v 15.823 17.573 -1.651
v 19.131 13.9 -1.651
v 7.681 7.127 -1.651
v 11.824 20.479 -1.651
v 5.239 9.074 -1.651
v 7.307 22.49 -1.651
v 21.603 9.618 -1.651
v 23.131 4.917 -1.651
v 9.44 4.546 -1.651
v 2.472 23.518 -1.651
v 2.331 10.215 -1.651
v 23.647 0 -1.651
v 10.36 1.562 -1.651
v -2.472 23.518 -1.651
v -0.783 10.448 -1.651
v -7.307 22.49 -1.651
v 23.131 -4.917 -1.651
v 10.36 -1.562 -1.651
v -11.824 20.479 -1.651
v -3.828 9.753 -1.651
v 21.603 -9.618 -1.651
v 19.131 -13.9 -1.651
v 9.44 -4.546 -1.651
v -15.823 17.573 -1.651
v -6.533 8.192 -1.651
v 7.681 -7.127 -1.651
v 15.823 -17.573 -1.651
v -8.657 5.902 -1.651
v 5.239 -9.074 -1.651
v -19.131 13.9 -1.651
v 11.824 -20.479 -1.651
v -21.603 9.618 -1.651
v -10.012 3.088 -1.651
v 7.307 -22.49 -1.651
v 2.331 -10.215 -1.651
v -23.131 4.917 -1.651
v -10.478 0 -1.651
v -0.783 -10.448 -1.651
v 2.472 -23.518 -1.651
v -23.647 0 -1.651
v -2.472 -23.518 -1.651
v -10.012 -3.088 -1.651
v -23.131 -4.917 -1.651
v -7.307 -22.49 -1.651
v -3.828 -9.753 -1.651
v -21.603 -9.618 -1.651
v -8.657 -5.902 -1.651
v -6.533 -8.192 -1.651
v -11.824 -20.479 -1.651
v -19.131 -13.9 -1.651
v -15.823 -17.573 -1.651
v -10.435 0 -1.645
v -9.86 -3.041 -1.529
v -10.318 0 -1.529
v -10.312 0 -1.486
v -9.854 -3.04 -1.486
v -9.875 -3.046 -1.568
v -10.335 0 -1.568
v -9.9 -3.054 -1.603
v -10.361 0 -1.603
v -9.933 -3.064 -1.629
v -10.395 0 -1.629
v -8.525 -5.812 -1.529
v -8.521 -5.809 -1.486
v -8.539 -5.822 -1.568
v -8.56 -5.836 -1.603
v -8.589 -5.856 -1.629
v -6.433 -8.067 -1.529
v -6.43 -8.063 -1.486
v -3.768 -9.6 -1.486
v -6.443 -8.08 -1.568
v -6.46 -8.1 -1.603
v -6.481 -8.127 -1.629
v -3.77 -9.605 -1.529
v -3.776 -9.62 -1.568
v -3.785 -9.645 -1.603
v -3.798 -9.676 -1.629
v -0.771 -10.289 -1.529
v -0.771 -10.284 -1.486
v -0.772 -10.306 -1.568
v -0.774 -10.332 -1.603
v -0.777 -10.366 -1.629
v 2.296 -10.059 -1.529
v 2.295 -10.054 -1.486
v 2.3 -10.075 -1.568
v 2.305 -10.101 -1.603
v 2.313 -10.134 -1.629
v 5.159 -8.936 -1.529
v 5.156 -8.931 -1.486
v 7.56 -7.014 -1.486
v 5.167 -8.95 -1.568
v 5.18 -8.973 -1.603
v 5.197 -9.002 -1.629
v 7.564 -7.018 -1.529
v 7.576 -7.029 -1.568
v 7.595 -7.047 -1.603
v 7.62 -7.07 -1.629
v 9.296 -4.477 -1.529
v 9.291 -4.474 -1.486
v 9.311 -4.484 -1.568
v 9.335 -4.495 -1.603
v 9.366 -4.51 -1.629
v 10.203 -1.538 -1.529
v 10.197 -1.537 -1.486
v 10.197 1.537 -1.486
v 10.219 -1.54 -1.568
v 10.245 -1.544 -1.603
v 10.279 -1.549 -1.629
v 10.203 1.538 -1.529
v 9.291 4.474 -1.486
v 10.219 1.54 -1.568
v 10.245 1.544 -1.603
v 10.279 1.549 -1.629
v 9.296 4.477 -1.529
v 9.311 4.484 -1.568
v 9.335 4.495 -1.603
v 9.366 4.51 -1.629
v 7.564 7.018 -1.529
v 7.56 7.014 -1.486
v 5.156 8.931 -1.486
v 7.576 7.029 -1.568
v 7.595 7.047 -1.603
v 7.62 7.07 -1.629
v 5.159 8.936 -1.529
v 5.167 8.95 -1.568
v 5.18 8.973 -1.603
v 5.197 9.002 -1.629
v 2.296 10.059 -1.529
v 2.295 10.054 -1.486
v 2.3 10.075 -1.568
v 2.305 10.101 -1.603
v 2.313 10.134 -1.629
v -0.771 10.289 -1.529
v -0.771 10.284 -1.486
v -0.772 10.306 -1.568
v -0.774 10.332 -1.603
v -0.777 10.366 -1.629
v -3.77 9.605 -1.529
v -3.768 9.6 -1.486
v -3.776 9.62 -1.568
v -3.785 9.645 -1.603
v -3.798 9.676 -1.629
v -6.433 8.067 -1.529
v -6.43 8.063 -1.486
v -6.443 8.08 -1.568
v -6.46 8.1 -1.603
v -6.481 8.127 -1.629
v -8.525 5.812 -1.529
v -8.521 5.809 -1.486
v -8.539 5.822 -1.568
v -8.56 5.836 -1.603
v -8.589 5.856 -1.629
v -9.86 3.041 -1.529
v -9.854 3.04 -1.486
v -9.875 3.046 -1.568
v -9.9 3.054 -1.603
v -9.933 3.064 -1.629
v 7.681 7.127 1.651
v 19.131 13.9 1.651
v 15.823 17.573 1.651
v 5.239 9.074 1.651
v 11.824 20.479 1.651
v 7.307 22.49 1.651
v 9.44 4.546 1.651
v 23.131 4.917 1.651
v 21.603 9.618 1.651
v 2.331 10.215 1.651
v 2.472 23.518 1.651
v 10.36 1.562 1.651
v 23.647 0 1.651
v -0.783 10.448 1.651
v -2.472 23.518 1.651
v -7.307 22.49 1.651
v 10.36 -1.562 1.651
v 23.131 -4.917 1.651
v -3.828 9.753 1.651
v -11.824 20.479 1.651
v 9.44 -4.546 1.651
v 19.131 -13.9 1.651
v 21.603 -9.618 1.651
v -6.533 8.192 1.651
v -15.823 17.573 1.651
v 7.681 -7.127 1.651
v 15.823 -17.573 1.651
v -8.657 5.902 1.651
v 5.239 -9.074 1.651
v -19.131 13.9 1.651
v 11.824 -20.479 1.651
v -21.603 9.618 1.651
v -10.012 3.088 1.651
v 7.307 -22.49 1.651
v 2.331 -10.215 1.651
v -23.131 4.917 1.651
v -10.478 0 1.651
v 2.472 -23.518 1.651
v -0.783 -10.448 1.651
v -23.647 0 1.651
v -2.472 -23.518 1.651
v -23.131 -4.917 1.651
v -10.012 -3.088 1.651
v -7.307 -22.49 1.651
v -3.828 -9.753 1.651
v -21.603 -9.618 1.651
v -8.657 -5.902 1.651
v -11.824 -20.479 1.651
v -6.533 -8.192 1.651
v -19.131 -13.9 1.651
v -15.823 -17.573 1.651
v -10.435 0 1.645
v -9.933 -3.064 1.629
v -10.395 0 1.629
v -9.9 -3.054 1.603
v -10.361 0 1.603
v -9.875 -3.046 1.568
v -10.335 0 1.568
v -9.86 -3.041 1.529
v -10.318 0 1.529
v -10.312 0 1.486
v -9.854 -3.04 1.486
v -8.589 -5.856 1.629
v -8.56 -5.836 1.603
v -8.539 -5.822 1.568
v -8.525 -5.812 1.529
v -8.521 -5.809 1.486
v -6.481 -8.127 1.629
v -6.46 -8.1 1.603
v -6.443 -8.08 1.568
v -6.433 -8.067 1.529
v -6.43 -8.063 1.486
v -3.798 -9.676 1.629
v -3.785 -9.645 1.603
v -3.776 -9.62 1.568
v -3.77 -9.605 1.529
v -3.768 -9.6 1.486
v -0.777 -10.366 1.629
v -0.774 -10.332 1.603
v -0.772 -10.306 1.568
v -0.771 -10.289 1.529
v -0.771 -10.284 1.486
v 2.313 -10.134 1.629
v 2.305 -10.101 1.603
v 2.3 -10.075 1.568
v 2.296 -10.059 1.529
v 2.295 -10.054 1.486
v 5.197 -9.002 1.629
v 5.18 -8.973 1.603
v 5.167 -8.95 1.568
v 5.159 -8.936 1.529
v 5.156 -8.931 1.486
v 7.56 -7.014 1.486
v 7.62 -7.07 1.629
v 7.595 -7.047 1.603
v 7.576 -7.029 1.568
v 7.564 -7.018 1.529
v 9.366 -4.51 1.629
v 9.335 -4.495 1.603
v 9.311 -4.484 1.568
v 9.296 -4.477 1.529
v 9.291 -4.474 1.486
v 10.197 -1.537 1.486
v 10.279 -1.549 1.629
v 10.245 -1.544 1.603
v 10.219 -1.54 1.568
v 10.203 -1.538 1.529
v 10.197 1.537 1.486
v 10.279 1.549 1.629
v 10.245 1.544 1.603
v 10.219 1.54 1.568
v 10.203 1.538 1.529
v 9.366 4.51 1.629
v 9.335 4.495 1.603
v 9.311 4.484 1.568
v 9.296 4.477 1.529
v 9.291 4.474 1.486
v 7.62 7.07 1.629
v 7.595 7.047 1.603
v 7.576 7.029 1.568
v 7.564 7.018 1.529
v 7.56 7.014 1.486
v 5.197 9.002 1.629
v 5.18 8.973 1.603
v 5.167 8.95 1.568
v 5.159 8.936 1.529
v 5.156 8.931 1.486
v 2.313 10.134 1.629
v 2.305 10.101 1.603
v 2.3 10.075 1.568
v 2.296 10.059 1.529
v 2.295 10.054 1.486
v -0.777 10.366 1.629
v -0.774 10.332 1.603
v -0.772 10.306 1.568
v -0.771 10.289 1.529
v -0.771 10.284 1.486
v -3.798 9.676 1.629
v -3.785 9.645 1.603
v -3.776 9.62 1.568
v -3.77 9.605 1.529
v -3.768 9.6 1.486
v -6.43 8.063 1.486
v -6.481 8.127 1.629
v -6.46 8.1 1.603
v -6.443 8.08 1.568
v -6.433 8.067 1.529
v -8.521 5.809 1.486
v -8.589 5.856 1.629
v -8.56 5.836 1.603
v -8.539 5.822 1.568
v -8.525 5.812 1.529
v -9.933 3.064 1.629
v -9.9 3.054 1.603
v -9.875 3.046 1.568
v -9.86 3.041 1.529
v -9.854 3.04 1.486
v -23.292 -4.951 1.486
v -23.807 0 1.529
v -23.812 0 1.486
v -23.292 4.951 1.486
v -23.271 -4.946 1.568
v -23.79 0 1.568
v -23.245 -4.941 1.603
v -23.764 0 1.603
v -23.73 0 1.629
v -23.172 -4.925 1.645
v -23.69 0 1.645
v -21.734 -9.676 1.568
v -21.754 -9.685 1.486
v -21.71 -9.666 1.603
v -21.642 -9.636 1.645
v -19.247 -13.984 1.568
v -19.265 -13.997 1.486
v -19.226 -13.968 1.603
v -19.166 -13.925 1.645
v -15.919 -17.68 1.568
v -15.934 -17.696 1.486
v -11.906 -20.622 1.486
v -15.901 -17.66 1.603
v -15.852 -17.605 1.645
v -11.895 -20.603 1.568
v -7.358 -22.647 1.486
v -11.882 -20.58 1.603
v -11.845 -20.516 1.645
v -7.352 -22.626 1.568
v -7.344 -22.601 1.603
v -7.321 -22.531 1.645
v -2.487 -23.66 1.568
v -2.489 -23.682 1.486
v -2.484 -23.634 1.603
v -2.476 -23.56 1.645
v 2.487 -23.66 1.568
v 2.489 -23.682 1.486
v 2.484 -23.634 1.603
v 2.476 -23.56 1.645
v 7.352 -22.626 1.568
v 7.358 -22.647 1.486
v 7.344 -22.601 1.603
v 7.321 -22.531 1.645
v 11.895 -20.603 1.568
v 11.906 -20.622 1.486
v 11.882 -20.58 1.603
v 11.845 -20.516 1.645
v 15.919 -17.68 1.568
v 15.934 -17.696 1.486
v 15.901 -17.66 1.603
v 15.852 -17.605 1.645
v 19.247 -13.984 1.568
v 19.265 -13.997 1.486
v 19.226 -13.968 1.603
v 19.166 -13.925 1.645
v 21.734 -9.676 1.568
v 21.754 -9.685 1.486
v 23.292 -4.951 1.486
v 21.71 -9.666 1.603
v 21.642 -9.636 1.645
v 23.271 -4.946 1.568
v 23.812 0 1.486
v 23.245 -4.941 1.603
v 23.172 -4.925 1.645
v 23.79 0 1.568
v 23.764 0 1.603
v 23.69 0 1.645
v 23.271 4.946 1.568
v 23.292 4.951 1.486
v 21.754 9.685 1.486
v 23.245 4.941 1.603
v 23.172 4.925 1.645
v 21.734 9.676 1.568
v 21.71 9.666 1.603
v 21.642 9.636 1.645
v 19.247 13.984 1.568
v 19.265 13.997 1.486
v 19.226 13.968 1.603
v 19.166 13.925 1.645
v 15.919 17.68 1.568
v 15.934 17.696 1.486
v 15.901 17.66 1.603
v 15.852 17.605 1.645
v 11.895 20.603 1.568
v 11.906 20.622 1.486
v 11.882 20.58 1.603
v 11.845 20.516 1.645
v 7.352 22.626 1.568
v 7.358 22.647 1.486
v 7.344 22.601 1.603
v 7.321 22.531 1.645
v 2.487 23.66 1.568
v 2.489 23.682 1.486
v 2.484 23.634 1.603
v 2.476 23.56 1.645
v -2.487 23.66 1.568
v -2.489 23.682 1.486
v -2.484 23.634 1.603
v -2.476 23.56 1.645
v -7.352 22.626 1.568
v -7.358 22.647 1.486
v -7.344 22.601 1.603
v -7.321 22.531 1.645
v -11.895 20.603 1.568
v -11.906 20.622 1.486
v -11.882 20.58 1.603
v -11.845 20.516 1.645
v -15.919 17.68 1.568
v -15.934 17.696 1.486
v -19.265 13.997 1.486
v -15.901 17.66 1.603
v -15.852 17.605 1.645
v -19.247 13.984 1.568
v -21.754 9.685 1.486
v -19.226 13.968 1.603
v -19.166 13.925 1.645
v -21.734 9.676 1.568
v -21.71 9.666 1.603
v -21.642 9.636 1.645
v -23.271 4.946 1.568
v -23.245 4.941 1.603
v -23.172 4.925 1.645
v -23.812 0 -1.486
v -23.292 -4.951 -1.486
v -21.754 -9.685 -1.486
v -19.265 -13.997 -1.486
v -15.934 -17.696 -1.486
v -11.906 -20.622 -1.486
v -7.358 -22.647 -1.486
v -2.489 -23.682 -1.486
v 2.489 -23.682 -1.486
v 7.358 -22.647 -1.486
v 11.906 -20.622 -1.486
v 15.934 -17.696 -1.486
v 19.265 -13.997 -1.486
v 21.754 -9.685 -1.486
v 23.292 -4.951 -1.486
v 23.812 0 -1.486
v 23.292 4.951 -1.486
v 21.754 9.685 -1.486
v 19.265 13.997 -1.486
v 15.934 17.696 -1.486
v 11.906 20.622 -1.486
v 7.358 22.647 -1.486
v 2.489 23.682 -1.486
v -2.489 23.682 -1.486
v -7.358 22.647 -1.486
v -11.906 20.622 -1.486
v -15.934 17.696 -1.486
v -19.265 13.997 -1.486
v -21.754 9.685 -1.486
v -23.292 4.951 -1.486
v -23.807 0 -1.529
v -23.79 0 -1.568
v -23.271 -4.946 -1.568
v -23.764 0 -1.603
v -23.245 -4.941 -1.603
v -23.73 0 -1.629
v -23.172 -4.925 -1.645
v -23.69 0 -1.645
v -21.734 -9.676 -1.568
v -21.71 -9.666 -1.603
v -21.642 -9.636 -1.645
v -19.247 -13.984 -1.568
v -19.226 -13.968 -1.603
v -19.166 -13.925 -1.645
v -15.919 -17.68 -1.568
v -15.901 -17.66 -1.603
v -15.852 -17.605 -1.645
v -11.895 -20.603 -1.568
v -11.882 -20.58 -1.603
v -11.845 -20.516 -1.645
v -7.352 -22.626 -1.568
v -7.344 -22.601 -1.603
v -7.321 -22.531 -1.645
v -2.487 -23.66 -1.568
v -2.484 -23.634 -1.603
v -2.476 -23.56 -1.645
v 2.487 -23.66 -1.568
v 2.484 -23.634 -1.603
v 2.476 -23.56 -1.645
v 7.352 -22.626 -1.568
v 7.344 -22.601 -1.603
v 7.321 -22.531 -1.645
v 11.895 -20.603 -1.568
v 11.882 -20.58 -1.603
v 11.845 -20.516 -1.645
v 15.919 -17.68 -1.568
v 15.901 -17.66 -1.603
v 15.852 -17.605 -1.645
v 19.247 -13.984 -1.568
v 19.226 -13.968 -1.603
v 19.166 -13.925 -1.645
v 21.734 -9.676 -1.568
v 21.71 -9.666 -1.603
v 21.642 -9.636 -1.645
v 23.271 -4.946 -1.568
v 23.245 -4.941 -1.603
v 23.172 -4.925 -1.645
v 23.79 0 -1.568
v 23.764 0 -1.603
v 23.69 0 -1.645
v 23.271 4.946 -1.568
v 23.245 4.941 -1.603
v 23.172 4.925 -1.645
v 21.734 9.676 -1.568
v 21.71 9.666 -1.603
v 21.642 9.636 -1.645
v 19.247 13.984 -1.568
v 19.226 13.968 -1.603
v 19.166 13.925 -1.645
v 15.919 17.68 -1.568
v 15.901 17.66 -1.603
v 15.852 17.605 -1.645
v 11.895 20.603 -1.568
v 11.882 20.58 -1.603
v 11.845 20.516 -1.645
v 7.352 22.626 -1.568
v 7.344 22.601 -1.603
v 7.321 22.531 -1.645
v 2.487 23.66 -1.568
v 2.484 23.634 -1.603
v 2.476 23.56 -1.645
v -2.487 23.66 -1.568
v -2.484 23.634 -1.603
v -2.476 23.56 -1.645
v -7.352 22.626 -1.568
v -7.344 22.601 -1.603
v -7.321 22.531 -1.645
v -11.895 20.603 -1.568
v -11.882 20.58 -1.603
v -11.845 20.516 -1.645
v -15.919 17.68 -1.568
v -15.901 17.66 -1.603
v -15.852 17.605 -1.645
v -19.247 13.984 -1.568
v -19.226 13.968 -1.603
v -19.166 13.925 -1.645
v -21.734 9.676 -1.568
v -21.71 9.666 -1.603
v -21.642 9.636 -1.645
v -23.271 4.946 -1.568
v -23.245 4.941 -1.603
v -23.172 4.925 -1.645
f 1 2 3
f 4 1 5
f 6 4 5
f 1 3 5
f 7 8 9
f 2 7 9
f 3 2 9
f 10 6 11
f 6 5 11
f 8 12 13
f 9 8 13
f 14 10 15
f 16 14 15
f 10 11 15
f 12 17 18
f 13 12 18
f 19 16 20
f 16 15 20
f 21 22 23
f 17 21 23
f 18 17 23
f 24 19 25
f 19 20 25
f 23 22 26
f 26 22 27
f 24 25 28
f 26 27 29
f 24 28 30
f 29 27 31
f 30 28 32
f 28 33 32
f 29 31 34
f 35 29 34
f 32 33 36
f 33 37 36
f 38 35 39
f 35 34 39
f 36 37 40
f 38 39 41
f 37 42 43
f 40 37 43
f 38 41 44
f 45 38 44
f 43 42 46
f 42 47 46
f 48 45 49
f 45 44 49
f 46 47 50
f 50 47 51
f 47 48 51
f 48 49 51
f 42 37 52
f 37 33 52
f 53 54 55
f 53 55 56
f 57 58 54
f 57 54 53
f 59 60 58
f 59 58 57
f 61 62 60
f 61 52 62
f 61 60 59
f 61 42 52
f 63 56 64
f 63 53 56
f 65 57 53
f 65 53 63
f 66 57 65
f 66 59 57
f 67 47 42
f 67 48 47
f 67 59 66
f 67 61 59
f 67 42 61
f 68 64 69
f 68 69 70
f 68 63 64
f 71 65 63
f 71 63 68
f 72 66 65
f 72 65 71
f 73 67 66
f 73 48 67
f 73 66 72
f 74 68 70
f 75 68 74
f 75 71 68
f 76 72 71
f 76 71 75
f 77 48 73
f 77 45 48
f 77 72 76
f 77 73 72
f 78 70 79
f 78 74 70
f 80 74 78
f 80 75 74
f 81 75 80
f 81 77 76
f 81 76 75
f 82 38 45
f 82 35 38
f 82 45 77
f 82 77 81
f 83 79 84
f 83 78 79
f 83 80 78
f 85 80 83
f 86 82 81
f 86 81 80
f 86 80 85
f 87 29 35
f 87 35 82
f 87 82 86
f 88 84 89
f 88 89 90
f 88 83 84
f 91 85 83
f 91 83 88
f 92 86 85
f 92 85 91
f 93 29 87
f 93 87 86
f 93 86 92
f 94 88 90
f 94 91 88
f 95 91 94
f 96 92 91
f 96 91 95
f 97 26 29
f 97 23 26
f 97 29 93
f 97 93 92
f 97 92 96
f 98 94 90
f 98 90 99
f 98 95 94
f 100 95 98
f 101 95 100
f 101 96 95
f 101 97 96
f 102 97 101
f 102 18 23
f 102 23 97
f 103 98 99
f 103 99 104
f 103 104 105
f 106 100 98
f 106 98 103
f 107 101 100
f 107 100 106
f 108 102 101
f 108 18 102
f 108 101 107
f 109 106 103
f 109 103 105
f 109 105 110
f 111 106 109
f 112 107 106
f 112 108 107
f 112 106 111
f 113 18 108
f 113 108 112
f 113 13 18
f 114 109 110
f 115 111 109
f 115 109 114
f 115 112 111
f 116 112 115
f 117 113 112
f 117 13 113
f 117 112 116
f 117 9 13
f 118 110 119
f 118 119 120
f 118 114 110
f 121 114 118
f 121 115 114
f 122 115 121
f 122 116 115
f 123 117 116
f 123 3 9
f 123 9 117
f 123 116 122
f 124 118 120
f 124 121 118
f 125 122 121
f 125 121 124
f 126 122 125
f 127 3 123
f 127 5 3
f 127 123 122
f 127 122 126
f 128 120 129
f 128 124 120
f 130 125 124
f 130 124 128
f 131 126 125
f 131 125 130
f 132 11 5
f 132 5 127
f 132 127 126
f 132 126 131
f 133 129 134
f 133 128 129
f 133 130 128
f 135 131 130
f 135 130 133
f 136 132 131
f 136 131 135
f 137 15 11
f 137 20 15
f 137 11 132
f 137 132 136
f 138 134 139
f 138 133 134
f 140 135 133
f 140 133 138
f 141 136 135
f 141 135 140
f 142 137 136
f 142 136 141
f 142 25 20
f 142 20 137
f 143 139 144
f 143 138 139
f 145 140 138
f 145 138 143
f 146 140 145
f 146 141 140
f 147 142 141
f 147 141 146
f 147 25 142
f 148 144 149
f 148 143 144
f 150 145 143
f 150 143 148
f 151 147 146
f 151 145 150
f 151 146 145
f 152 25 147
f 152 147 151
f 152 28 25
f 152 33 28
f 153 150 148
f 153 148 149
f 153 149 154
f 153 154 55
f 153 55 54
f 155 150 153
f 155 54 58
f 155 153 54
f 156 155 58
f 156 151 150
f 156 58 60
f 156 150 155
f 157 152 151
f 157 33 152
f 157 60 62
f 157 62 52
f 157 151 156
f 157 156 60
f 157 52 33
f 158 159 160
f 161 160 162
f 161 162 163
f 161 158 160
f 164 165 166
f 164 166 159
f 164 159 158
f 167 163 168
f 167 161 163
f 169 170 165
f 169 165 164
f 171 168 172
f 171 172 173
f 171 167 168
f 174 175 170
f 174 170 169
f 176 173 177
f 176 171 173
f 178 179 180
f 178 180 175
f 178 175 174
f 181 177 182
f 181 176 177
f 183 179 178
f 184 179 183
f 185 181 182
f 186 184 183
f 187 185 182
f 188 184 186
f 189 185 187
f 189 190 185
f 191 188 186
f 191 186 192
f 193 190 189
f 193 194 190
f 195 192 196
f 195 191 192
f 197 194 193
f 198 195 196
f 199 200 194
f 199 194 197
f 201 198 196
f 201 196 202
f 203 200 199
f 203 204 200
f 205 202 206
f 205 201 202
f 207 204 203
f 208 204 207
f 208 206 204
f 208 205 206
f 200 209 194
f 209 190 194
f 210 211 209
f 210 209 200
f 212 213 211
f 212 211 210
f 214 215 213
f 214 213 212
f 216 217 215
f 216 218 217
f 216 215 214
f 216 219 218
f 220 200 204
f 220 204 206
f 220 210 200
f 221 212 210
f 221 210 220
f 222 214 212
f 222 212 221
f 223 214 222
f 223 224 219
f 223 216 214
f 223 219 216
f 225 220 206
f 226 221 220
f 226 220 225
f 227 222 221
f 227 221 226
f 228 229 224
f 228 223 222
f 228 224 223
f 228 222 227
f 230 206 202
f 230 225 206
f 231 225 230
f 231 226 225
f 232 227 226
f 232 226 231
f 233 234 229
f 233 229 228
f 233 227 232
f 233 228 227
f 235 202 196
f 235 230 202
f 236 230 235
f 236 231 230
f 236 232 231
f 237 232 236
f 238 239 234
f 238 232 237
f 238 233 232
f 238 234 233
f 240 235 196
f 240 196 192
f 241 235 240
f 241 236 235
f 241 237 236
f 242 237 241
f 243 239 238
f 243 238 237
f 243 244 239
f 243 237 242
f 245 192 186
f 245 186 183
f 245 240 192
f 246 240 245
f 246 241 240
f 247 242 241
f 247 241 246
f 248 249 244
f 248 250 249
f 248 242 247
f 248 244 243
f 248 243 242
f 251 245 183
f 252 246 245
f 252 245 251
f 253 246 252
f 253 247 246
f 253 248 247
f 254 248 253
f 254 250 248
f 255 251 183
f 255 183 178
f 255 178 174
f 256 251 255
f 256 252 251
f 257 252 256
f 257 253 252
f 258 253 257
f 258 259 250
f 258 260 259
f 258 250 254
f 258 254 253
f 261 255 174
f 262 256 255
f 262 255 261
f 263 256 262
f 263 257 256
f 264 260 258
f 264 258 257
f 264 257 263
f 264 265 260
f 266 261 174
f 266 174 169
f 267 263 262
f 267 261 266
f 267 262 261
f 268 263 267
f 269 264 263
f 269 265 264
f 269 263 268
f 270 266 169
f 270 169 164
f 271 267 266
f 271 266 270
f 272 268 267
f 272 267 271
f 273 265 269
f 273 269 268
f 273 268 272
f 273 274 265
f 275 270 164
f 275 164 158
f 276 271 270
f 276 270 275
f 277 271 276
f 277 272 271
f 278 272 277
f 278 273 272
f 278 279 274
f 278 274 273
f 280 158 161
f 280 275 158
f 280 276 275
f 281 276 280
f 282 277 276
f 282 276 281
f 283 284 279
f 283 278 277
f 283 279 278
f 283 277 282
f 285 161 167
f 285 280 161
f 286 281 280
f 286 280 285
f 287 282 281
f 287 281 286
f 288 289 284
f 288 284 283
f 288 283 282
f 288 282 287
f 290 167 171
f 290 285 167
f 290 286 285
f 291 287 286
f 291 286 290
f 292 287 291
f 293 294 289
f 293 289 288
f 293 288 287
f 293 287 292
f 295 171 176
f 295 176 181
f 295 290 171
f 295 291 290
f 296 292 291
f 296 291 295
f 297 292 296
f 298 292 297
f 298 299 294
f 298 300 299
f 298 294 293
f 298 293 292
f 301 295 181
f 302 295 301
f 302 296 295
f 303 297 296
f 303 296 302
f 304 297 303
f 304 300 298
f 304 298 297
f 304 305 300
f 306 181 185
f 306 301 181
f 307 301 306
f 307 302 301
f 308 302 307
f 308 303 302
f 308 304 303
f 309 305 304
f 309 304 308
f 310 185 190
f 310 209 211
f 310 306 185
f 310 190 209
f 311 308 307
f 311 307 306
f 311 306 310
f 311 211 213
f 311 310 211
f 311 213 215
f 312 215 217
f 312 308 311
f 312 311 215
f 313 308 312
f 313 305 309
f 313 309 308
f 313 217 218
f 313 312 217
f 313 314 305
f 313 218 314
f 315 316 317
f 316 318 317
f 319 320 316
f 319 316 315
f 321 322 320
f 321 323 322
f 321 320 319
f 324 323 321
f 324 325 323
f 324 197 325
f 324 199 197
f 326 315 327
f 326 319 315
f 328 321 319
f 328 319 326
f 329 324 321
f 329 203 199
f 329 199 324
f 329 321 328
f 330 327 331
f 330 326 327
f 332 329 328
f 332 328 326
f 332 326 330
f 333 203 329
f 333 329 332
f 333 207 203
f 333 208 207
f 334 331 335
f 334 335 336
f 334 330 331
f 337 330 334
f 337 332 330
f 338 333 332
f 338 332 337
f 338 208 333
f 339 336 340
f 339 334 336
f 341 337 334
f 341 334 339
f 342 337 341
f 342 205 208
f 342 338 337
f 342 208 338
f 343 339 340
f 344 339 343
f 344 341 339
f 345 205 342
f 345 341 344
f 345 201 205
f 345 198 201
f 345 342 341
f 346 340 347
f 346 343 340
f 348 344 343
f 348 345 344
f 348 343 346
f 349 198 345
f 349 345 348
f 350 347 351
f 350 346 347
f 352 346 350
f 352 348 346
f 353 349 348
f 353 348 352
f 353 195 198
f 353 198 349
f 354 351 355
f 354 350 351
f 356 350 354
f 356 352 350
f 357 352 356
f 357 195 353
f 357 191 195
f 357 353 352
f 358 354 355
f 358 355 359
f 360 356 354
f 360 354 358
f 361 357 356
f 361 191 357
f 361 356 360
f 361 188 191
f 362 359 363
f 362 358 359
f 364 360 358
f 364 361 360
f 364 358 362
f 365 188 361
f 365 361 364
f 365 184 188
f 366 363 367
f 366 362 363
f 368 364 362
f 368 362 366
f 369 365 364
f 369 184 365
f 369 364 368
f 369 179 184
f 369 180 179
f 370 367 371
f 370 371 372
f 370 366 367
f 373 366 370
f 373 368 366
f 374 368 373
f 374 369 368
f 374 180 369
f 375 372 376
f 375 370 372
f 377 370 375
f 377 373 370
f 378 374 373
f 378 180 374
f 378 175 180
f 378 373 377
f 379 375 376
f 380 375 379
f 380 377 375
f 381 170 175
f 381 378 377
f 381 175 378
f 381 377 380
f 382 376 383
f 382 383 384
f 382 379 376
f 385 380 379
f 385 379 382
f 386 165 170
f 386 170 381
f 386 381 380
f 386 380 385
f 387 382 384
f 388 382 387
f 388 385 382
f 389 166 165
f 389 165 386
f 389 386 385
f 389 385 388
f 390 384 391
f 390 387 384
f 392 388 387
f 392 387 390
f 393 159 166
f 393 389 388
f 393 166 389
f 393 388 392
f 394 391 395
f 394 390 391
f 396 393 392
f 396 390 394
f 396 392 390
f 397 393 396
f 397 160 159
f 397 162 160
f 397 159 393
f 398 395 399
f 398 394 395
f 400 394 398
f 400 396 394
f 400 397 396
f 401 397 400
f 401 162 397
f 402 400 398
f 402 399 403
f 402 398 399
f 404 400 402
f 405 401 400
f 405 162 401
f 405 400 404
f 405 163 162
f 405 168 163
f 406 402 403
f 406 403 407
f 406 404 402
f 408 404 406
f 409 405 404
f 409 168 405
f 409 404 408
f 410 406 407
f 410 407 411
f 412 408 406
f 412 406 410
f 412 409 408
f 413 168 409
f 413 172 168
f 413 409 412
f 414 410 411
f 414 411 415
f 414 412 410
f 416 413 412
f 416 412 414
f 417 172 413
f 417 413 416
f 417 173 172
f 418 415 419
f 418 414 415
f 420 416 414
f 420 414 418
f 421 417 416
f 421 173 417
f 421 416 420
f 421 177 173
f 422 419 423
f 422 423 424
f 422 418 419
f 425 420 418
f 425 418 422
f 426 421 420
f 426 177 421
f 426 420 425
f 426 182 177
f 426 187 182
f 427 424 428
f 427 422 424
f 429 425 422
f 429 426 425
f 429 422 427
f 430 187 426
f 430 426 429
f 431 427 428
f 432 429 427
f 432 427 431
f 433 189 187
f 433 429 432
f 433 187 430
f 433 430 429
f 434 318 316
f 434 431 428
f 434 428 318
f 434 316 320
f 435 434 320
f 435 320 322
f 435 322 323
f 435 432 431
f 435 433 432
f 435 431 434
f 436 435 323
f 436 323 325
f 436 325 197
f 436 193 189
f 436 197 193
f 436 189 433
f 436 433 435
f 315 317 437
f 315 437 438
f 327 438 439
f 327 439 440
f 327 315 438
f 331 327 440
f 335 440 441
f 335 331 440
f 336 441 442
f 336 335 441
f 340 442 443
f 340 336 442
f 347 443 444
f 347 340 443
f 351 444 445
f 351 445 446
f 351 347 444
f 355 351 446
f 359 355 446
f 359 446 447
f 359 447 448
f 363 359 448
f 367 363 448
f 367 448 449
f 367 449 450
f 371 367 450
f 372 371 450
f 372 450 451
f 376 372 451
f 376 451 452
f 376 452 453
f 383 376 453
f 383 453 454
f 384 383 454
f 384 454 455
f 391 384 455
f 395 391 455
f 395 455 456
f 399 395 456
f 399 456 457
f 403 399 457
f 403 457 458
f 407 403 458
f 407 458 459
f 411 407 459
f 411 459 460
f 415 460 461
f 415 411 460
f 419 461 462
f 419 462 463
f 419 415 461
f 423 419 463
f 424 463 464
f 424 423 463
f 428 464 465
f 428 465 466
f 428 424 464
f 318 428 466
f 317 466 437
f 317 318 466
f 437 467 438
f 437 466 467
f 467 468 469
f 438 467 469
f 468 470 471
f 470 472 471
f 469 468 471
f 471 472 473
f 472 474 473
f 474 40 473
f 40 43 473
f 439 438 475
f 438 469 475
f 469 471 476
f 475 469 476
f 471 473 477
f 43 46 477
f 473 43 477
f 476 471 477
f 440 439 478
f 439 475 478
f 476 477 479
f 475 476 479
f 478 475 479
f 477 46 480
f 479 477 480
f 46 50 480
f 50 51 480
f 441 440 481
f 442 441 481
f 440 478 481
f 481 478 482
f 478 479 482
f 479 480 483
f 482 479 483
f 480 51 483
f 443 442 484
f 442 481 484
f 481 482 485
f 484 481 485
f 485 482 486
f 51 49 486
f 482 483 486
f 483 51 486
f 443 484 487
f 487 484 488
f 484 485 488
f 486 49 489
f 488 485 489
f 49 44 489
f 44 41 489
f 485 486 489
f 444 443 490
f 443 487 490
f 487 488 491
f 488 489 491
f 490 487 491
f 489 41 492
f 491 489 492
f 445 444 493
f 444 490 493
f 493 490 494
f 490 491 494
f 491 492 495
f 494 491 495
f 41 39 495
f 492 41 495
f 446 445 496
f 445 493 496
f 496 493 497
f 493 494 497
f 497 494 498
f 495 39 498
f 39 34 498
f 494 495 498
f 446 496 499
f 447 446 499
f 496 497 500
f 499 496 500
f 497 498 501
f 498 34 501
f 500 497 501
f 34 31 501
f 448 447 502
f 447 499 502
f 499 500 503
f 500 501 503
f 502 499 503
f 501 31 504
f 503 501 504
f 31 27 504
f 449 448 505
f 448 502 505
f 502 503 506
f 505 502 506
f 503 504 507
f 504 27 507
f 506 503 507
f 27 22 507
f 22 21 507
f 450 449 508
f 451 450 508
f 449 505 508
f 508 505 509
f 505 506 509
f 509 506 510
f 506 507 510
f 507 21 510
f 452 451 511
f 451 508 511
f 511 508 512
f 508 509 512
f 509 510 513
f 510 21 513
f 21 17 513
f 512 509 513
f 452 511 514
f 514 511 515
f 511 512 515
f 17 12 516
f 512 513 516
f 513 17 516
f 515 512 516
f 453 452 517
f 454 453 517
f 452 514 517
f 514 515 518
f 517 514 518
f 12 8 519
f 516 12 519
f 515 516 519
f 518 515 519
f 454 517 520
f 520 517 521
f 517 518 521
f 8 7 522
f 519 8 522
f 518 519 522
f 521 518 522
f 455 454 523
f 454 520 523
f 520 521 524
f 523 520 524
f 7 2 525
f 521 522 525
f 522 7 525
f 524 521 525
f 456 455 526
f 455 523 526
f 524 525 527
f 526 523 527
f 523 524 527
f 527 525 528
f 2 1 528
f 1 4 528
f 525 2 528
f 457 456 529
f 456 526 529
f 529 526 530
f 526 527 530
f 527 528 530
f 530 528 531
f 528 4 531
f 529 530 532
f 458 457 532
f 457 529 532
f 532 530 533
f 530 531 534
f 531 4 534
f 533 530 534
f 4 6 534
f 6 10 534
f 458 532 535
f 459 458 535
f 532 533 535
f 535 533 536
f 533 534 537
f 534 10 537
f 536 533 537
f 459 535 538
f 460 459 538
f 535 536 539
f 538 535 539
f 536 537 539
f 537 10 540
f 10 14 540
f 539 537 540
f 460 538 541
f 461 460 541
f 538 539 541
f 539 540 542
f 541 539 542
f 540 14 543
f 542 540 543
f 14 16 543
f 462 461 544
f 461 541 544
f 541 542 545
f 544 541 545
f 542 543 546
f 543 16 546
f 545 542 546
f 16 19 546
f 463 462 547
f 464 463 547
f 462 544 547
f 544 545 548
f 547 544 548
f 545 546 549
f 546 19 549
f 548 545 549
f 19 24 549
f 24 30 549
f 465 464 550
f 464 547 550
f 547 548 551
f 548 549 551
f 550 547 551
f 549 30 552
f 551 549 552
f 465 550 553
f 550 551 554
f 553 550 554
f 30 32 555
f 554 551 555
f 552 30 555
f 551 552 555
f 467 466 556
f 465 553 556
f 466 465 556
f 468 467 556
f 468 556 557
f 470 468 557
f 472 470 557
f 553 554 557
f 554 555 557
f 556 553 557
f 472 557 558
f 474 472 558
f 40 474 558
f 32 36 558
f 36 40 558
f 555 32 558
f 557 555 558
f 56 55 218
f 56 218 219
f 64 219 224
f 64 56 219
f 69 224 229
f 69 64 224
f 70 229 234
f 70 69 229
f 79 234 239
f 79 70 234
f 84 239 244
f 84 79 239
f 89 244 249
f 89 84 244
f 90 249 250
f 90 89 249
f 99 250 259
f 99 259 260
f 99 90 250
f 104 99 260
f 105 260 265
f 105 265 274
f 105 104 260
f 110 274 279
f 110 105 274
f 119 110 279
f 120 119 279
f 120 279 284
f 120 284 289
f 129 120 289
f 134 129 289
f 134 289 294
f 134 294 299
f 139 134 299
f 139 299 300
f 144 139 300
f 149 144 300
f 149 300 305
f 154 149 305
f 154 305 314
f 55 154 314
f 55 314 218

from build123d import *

# Parameters (mm, degrees)
SKETCH3_R           = 23.8125
SKETCH3_R_2         = 10.3124
BOSS_EXTRUDE1_DEPTH = 1.651
FILLET1_R           = 0.1651


with BuildPart() as part:
    # Sketch3 → Boss-Extrude1 (new, symmetric)
    with BuildSketch(Plane.XY):
        with Locations(Location((0, 0, 0), (0, 0, 180))):
            Circle(SKETCH3_R)
        with Locations(Location((0, 0, 0), (0, 0, 180))):
            Circle(SKETCH3_R_2, mode=Mode.SUBTRACT)
    extrude(amount=BOSS_EXTRUDE1_DEPTH, both=True)

    # Fillet1
    fillet1_edges = [part.edges().sort_by_distance(p)[0] for p in [
        (23.8125, 0, -1.651),
        (23.8125, 0, 1.651),
        (10.3124, 0, -1.651),
        (10.3124, 0, 1.651),
    ]]
    fillet(fillet1_edges, radius=FILLET1_R)


solid = part.part
